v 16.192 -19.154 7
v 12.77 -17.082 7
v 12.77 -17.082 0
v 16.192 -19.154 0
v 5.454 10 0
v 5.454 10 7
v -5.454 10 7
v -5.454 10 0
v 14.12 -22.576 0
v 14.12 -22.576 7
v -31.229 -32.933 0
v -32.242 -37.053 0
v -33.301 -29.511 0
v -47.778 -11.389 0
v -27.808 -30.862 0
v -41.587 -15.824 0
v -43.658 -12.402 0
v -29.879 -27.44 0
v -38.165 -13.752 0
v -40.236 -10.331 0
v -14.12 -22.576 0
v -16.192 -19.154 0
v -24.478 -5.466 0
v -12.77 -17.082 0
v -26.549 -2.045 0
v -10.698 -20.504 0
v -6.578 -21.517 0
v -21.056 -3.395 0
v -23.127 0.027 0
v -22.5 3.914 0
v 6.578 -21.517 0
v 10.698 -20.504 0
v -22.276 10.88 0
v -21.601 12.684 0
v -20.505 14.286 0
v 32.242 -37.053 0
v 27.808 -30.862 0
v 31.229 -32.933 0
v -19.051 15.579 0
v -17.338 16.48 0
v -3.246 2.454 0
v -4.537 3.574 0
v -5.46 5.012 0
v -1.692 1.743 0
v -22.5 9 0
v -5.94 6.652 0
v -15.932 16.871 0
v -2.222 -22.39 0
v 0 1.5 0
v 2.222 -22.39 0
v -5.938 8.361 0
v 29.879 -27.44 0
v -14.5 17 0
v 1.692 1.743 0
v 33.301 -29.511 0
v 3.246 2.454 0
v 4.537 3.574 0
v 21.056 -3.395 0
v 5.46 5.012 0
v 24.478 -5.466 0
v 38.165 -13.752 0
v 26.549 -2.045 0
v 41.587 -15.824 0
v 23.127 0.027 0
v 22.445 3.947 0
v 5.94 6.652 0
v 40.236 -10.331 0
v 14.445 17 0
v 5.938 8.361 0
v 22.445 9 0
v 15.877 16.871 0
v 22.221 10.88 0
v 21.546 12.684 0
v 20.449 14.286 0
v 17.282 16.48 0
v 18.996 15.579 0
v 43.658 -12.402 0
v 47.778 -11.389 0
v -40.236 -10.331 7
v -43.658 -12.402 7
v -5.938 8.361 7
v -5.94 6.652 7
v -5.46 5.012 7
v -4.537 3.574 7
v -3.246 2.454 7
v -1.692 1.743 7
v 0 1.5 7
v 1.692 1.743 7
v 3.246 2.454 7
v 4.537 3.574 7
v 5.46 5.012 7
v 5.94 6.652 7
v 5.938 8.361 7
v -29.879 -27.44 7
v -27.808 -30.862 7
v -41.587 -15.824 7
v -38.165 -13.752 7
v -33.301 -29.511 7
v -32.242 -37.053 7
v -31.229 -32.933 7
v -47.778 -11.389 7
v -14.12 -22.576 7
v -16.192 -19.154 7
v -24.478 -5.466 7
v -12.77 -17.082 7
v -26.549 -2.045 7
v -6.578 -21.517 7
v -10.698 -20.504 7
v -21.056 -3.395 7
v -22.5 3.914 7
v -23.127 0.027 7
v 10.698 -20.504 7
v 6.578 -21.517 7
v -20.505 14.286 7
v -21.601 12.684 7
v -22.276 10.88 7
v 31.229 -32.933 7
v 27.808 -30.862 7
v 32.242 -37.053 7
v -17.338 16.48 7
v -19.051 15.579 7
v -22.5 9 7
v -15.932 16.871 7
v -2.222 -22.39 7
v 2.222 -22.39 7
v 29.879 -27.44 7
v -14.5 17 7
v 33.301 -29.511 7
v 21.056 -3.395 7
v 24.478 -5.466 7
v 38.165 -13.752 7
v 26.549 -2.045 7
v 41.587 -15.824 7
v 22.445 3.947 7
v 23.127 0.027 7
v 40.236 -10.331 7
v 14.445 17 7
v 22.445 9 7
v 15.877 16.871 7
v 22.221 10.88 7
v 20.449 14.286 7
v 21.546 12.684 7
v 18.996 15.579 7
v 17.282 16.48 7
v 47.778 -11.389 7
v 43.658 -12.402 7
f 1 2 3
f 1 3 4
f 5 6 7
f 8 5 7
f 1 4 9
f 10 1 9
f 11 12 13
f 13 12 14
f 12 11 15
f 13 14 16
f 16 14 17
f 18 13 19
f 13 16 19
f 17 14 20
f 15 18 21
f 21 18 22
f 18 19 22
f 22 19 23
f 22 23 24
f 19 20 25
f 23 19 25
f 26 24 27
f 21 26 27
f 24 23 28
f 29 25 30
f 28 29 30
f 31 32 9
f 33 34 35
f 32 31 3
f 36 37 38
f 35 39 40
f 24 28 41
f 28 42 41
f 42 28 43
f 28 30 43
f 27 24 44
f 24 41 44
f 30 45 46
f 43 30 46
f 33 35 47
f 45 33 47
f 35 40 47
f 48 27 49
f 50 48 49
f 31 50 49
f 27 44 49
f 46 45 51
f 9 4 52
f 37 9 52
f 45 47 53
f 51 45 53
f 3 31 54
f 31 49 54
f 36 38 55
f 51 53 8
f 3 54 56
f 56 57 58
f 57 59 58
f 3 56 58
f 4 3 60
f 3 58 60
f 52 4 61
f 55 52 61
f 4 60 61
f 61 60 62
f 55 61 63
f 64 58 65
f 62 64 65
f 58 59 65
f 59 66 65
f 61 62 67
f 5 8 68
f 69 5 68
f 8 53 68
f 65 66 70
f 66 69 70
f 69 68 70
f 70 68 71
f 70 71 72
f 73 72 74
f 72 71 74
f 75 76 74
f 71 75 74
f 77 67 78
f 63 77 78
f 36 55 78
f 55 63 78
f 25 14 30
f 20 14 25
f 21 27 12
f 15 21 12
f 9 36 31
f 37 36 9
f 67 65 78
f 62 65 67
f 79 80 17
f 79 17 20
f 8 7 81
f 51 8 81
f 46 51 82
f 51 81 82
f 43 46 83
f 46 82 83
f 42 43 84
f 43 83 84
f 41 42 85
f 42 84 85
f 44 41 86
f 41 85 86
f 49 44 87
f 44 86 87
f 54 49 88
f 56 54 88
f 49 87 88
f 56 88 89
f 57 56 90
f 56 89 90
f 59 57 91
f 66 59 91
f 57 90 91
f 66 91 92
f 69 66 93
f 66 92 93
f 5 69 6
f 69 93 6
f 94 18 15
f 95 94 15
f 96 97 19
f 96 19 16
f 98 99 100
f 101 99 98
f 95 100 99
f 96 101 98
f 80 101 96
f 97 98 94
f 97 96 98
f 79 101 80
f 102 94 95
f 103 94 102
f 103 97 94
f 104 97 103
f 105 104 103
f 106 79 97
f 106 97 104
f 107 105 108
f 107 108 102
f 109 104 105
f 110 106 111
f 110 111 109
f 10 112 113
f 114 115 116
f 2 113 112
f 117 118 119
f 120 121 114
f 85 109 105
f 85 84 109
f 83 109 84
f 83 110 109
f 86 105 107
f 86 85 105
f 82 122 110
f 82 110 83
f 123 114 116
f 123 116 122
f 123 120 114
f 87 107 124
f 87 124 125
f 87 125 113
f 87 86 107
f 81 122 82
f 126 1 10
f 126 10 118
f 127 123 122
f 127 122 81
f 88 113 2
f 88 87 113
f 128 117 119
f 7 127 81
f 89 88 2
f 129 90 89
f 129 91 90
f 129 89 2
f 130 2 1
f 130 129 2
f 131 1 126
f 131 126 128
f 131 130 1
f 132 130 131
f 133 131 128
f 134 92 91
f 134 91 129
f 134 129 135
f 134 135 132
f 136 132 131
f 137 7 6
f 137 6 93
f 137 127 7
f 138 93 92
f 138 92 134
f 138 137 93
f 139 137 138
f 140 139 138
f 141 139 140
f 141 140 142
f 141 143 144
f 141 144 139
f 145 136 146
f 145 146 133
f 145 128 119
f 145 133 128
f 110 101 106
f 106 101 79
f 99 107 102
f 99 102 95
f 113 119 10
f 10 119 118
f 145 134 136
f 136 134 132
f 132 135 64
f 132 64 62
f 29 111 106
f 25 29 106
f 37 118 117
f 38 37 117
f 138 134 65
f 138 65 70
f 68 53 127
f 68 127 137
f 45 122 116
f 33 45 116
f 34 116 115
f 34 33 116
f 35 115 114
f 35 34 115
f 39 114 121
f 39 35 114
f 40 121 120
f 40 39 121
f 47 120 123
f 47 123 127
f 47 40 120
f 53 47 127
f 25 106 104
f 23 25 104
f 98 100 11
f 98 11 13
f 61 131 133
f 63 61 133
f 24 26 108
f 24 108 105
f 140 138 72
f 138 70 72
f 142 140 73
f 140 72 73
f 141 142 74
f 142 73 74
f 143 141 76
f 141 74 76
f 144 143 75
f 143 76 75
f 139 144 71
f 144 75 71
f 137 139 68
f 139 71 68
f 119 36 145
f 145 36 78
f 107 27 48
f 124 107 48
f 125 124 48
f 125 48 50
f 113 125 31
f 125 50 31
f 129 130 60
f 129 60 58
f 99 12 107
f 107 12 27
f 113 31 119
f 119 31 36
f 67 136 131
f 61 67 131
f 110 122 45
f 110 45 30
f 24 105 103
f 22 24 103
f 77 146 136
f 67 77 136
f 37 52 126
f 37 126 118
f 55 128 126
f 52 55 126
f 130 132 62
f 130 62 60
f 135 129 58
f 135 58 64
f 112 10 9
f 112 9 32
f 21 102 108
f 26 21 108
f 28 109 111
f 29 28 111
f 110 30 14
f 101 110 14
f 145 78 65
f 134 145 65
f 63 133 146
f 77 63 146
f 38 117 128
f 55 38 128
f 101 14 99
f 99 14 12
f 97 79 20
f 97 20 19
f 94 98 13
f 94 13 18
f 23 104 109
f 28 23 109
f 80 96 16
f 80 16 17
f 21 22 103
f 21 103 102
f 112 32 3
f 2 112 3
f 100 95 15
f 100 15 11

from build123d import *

# Parameters (mm, degrees)
BOSS_EXTRUDE1_DEPTH     = 7
CUT_EXTRUDE1_DEPTH      = 10
CUT_EXTRUDE2_DEPTH      = 10
SKETCH6_W               = 67.896181325
SKETCH6_H               = 26.410991635
CUT_EXTRUDE3_DEPTH      = 8
CUT_EXTRUDE3_DEPTH_BACK = 1
FILLET1_R               = 8


with BuildPart() as part:
    # Sketch2 → Boss-Extrude1 (new body)
    with BuildSketch(Plane.XY):
        with BuildLine():
            Line((47.778278861, -11.389322146), (22.444705062, 3.947002617))
            Line((22.444705062, 3.947002617), (22.444705062, 13.423543635))
            ThreePointArc((22.444705062, 13.423543635), (0.788712907, 37.486172016), (-22.5, 15))
            Line((-22.5, 15), (-22.5, 3.913528416))
            Line((-22.5, 3.913528416), (-47.778278861, -11.389322146))
            Line((-47.778278861, -11.389322146), (-32.24208854, -37.05304733))
            Line((-32.24208854, -37.05304733), (-6.578363356, -21.516857009))
            ThreePointArc((-6.578363356, -21.516857009), (0, -22.5), (6.578363356, -21.516857009))
            Line((6.578363356, -21.516857009), (32.24208854, -37.05304733))
            Line((32.24208854, -37.05304733), (47.778278861, -11.389322146))
        make_face()
    extrude(amount=BOSS_EXTRUDE1_DEPTH)

    # Sketch4 → Cut-Extrude1 (cut)
    with BuildSketch(Plane.XY.offset(7)):
        Polygon((-43.658287311, -12.402075633), (-40.236457286, -10.33058359), (-38.164965243, -13.752413614), (-41.586795268, -15.823905657), align=None)
        Polygon((-23.127307163, 0.026876624), (-26.549137188, -2.044615419), (-24.477645145, -5.466445443), (-21.055815121, -3.3949534), align=None)
        Polygon((-31.229335054, -32.93305578), (-33.300827097, -29.511225755), (-29.878997072, -27.439733712), (-27.807505029, -30.861563737), align=None)
        Polygon((-10.698354907, -20.504103523), (-12.76984695, -17.082273498), (-16.191676974, -19.153765541), (-14.120184931, -22.575595566), align=None)
        Polygon((23.127307163, 0.026876624), (26.549137188, -2.044615419), (24.477645145, -5.466445443), (21.055815121, -3.3949534), align=None)
        Polygon((43.658287311, -12.402075633), (40.236457286, -10.33058359), (38.164965243, -13.752413614), (41.586795268, -15.823905657), align=None)
        Polygon((31.229335054, -32.93305578), (33.300827097, -29.511225755), (29.878997072, -27.439733712), (27.807505029, -30.861563737), align=None)
        Polygon((10.698354907, -20.504103523), (12.76984695, -17.082273498), (16.191676974, -19.153765541), (14.120184931, -22.575595566), align=None)
    extrude(amount=-CUT_EXTRUDE1_DEPTH, mode=Mode.SUBTRACT)

    # Sketch5 → Cut-Extrude2 (cut)
    with BuildSketch(Plane.XY.offset(7)):
        with BuildLine():
            Line((5.454356057, 10), (-5.454356057, 10))
            ThreePointArc((-5.454356057, 10), (0, 1.5), (5.454356057, 10))
        make_face()
    extrude(amount=-CUT_EXTRUDE2_DEPTH, mode=Mode.SUBTRACT)

    # Sketch6 → Cut-Extrude3 (cut, two sides)
    with BuildSketch(Plane.XY) as cut_extrude3_sk:
        with Locations((-0.747480896, 30.205495818)):
            Rectangle(SKETCH6_W, SKETCH6_H)
    extrude(amount=CUT_EXTRUDE3_DEPTH, mode=Mode.SUBTRACT)
    extrude(cut_extrude3_sk.sketch, amount=-CUT_EXTRUDE3_DEPTH_BACK, mode=Mode.SUBTRACT)

    # Fillet1
    fillet1_edges = [part.edges().sort_by_distance(p)[0] for p in [
        (22.410934831, 17, 3.5),
        (-22.410934831, 17, 3.5),
    ]]
    fillet(fillet1_edges, radius=FILLET1_R)


solid = part.part
